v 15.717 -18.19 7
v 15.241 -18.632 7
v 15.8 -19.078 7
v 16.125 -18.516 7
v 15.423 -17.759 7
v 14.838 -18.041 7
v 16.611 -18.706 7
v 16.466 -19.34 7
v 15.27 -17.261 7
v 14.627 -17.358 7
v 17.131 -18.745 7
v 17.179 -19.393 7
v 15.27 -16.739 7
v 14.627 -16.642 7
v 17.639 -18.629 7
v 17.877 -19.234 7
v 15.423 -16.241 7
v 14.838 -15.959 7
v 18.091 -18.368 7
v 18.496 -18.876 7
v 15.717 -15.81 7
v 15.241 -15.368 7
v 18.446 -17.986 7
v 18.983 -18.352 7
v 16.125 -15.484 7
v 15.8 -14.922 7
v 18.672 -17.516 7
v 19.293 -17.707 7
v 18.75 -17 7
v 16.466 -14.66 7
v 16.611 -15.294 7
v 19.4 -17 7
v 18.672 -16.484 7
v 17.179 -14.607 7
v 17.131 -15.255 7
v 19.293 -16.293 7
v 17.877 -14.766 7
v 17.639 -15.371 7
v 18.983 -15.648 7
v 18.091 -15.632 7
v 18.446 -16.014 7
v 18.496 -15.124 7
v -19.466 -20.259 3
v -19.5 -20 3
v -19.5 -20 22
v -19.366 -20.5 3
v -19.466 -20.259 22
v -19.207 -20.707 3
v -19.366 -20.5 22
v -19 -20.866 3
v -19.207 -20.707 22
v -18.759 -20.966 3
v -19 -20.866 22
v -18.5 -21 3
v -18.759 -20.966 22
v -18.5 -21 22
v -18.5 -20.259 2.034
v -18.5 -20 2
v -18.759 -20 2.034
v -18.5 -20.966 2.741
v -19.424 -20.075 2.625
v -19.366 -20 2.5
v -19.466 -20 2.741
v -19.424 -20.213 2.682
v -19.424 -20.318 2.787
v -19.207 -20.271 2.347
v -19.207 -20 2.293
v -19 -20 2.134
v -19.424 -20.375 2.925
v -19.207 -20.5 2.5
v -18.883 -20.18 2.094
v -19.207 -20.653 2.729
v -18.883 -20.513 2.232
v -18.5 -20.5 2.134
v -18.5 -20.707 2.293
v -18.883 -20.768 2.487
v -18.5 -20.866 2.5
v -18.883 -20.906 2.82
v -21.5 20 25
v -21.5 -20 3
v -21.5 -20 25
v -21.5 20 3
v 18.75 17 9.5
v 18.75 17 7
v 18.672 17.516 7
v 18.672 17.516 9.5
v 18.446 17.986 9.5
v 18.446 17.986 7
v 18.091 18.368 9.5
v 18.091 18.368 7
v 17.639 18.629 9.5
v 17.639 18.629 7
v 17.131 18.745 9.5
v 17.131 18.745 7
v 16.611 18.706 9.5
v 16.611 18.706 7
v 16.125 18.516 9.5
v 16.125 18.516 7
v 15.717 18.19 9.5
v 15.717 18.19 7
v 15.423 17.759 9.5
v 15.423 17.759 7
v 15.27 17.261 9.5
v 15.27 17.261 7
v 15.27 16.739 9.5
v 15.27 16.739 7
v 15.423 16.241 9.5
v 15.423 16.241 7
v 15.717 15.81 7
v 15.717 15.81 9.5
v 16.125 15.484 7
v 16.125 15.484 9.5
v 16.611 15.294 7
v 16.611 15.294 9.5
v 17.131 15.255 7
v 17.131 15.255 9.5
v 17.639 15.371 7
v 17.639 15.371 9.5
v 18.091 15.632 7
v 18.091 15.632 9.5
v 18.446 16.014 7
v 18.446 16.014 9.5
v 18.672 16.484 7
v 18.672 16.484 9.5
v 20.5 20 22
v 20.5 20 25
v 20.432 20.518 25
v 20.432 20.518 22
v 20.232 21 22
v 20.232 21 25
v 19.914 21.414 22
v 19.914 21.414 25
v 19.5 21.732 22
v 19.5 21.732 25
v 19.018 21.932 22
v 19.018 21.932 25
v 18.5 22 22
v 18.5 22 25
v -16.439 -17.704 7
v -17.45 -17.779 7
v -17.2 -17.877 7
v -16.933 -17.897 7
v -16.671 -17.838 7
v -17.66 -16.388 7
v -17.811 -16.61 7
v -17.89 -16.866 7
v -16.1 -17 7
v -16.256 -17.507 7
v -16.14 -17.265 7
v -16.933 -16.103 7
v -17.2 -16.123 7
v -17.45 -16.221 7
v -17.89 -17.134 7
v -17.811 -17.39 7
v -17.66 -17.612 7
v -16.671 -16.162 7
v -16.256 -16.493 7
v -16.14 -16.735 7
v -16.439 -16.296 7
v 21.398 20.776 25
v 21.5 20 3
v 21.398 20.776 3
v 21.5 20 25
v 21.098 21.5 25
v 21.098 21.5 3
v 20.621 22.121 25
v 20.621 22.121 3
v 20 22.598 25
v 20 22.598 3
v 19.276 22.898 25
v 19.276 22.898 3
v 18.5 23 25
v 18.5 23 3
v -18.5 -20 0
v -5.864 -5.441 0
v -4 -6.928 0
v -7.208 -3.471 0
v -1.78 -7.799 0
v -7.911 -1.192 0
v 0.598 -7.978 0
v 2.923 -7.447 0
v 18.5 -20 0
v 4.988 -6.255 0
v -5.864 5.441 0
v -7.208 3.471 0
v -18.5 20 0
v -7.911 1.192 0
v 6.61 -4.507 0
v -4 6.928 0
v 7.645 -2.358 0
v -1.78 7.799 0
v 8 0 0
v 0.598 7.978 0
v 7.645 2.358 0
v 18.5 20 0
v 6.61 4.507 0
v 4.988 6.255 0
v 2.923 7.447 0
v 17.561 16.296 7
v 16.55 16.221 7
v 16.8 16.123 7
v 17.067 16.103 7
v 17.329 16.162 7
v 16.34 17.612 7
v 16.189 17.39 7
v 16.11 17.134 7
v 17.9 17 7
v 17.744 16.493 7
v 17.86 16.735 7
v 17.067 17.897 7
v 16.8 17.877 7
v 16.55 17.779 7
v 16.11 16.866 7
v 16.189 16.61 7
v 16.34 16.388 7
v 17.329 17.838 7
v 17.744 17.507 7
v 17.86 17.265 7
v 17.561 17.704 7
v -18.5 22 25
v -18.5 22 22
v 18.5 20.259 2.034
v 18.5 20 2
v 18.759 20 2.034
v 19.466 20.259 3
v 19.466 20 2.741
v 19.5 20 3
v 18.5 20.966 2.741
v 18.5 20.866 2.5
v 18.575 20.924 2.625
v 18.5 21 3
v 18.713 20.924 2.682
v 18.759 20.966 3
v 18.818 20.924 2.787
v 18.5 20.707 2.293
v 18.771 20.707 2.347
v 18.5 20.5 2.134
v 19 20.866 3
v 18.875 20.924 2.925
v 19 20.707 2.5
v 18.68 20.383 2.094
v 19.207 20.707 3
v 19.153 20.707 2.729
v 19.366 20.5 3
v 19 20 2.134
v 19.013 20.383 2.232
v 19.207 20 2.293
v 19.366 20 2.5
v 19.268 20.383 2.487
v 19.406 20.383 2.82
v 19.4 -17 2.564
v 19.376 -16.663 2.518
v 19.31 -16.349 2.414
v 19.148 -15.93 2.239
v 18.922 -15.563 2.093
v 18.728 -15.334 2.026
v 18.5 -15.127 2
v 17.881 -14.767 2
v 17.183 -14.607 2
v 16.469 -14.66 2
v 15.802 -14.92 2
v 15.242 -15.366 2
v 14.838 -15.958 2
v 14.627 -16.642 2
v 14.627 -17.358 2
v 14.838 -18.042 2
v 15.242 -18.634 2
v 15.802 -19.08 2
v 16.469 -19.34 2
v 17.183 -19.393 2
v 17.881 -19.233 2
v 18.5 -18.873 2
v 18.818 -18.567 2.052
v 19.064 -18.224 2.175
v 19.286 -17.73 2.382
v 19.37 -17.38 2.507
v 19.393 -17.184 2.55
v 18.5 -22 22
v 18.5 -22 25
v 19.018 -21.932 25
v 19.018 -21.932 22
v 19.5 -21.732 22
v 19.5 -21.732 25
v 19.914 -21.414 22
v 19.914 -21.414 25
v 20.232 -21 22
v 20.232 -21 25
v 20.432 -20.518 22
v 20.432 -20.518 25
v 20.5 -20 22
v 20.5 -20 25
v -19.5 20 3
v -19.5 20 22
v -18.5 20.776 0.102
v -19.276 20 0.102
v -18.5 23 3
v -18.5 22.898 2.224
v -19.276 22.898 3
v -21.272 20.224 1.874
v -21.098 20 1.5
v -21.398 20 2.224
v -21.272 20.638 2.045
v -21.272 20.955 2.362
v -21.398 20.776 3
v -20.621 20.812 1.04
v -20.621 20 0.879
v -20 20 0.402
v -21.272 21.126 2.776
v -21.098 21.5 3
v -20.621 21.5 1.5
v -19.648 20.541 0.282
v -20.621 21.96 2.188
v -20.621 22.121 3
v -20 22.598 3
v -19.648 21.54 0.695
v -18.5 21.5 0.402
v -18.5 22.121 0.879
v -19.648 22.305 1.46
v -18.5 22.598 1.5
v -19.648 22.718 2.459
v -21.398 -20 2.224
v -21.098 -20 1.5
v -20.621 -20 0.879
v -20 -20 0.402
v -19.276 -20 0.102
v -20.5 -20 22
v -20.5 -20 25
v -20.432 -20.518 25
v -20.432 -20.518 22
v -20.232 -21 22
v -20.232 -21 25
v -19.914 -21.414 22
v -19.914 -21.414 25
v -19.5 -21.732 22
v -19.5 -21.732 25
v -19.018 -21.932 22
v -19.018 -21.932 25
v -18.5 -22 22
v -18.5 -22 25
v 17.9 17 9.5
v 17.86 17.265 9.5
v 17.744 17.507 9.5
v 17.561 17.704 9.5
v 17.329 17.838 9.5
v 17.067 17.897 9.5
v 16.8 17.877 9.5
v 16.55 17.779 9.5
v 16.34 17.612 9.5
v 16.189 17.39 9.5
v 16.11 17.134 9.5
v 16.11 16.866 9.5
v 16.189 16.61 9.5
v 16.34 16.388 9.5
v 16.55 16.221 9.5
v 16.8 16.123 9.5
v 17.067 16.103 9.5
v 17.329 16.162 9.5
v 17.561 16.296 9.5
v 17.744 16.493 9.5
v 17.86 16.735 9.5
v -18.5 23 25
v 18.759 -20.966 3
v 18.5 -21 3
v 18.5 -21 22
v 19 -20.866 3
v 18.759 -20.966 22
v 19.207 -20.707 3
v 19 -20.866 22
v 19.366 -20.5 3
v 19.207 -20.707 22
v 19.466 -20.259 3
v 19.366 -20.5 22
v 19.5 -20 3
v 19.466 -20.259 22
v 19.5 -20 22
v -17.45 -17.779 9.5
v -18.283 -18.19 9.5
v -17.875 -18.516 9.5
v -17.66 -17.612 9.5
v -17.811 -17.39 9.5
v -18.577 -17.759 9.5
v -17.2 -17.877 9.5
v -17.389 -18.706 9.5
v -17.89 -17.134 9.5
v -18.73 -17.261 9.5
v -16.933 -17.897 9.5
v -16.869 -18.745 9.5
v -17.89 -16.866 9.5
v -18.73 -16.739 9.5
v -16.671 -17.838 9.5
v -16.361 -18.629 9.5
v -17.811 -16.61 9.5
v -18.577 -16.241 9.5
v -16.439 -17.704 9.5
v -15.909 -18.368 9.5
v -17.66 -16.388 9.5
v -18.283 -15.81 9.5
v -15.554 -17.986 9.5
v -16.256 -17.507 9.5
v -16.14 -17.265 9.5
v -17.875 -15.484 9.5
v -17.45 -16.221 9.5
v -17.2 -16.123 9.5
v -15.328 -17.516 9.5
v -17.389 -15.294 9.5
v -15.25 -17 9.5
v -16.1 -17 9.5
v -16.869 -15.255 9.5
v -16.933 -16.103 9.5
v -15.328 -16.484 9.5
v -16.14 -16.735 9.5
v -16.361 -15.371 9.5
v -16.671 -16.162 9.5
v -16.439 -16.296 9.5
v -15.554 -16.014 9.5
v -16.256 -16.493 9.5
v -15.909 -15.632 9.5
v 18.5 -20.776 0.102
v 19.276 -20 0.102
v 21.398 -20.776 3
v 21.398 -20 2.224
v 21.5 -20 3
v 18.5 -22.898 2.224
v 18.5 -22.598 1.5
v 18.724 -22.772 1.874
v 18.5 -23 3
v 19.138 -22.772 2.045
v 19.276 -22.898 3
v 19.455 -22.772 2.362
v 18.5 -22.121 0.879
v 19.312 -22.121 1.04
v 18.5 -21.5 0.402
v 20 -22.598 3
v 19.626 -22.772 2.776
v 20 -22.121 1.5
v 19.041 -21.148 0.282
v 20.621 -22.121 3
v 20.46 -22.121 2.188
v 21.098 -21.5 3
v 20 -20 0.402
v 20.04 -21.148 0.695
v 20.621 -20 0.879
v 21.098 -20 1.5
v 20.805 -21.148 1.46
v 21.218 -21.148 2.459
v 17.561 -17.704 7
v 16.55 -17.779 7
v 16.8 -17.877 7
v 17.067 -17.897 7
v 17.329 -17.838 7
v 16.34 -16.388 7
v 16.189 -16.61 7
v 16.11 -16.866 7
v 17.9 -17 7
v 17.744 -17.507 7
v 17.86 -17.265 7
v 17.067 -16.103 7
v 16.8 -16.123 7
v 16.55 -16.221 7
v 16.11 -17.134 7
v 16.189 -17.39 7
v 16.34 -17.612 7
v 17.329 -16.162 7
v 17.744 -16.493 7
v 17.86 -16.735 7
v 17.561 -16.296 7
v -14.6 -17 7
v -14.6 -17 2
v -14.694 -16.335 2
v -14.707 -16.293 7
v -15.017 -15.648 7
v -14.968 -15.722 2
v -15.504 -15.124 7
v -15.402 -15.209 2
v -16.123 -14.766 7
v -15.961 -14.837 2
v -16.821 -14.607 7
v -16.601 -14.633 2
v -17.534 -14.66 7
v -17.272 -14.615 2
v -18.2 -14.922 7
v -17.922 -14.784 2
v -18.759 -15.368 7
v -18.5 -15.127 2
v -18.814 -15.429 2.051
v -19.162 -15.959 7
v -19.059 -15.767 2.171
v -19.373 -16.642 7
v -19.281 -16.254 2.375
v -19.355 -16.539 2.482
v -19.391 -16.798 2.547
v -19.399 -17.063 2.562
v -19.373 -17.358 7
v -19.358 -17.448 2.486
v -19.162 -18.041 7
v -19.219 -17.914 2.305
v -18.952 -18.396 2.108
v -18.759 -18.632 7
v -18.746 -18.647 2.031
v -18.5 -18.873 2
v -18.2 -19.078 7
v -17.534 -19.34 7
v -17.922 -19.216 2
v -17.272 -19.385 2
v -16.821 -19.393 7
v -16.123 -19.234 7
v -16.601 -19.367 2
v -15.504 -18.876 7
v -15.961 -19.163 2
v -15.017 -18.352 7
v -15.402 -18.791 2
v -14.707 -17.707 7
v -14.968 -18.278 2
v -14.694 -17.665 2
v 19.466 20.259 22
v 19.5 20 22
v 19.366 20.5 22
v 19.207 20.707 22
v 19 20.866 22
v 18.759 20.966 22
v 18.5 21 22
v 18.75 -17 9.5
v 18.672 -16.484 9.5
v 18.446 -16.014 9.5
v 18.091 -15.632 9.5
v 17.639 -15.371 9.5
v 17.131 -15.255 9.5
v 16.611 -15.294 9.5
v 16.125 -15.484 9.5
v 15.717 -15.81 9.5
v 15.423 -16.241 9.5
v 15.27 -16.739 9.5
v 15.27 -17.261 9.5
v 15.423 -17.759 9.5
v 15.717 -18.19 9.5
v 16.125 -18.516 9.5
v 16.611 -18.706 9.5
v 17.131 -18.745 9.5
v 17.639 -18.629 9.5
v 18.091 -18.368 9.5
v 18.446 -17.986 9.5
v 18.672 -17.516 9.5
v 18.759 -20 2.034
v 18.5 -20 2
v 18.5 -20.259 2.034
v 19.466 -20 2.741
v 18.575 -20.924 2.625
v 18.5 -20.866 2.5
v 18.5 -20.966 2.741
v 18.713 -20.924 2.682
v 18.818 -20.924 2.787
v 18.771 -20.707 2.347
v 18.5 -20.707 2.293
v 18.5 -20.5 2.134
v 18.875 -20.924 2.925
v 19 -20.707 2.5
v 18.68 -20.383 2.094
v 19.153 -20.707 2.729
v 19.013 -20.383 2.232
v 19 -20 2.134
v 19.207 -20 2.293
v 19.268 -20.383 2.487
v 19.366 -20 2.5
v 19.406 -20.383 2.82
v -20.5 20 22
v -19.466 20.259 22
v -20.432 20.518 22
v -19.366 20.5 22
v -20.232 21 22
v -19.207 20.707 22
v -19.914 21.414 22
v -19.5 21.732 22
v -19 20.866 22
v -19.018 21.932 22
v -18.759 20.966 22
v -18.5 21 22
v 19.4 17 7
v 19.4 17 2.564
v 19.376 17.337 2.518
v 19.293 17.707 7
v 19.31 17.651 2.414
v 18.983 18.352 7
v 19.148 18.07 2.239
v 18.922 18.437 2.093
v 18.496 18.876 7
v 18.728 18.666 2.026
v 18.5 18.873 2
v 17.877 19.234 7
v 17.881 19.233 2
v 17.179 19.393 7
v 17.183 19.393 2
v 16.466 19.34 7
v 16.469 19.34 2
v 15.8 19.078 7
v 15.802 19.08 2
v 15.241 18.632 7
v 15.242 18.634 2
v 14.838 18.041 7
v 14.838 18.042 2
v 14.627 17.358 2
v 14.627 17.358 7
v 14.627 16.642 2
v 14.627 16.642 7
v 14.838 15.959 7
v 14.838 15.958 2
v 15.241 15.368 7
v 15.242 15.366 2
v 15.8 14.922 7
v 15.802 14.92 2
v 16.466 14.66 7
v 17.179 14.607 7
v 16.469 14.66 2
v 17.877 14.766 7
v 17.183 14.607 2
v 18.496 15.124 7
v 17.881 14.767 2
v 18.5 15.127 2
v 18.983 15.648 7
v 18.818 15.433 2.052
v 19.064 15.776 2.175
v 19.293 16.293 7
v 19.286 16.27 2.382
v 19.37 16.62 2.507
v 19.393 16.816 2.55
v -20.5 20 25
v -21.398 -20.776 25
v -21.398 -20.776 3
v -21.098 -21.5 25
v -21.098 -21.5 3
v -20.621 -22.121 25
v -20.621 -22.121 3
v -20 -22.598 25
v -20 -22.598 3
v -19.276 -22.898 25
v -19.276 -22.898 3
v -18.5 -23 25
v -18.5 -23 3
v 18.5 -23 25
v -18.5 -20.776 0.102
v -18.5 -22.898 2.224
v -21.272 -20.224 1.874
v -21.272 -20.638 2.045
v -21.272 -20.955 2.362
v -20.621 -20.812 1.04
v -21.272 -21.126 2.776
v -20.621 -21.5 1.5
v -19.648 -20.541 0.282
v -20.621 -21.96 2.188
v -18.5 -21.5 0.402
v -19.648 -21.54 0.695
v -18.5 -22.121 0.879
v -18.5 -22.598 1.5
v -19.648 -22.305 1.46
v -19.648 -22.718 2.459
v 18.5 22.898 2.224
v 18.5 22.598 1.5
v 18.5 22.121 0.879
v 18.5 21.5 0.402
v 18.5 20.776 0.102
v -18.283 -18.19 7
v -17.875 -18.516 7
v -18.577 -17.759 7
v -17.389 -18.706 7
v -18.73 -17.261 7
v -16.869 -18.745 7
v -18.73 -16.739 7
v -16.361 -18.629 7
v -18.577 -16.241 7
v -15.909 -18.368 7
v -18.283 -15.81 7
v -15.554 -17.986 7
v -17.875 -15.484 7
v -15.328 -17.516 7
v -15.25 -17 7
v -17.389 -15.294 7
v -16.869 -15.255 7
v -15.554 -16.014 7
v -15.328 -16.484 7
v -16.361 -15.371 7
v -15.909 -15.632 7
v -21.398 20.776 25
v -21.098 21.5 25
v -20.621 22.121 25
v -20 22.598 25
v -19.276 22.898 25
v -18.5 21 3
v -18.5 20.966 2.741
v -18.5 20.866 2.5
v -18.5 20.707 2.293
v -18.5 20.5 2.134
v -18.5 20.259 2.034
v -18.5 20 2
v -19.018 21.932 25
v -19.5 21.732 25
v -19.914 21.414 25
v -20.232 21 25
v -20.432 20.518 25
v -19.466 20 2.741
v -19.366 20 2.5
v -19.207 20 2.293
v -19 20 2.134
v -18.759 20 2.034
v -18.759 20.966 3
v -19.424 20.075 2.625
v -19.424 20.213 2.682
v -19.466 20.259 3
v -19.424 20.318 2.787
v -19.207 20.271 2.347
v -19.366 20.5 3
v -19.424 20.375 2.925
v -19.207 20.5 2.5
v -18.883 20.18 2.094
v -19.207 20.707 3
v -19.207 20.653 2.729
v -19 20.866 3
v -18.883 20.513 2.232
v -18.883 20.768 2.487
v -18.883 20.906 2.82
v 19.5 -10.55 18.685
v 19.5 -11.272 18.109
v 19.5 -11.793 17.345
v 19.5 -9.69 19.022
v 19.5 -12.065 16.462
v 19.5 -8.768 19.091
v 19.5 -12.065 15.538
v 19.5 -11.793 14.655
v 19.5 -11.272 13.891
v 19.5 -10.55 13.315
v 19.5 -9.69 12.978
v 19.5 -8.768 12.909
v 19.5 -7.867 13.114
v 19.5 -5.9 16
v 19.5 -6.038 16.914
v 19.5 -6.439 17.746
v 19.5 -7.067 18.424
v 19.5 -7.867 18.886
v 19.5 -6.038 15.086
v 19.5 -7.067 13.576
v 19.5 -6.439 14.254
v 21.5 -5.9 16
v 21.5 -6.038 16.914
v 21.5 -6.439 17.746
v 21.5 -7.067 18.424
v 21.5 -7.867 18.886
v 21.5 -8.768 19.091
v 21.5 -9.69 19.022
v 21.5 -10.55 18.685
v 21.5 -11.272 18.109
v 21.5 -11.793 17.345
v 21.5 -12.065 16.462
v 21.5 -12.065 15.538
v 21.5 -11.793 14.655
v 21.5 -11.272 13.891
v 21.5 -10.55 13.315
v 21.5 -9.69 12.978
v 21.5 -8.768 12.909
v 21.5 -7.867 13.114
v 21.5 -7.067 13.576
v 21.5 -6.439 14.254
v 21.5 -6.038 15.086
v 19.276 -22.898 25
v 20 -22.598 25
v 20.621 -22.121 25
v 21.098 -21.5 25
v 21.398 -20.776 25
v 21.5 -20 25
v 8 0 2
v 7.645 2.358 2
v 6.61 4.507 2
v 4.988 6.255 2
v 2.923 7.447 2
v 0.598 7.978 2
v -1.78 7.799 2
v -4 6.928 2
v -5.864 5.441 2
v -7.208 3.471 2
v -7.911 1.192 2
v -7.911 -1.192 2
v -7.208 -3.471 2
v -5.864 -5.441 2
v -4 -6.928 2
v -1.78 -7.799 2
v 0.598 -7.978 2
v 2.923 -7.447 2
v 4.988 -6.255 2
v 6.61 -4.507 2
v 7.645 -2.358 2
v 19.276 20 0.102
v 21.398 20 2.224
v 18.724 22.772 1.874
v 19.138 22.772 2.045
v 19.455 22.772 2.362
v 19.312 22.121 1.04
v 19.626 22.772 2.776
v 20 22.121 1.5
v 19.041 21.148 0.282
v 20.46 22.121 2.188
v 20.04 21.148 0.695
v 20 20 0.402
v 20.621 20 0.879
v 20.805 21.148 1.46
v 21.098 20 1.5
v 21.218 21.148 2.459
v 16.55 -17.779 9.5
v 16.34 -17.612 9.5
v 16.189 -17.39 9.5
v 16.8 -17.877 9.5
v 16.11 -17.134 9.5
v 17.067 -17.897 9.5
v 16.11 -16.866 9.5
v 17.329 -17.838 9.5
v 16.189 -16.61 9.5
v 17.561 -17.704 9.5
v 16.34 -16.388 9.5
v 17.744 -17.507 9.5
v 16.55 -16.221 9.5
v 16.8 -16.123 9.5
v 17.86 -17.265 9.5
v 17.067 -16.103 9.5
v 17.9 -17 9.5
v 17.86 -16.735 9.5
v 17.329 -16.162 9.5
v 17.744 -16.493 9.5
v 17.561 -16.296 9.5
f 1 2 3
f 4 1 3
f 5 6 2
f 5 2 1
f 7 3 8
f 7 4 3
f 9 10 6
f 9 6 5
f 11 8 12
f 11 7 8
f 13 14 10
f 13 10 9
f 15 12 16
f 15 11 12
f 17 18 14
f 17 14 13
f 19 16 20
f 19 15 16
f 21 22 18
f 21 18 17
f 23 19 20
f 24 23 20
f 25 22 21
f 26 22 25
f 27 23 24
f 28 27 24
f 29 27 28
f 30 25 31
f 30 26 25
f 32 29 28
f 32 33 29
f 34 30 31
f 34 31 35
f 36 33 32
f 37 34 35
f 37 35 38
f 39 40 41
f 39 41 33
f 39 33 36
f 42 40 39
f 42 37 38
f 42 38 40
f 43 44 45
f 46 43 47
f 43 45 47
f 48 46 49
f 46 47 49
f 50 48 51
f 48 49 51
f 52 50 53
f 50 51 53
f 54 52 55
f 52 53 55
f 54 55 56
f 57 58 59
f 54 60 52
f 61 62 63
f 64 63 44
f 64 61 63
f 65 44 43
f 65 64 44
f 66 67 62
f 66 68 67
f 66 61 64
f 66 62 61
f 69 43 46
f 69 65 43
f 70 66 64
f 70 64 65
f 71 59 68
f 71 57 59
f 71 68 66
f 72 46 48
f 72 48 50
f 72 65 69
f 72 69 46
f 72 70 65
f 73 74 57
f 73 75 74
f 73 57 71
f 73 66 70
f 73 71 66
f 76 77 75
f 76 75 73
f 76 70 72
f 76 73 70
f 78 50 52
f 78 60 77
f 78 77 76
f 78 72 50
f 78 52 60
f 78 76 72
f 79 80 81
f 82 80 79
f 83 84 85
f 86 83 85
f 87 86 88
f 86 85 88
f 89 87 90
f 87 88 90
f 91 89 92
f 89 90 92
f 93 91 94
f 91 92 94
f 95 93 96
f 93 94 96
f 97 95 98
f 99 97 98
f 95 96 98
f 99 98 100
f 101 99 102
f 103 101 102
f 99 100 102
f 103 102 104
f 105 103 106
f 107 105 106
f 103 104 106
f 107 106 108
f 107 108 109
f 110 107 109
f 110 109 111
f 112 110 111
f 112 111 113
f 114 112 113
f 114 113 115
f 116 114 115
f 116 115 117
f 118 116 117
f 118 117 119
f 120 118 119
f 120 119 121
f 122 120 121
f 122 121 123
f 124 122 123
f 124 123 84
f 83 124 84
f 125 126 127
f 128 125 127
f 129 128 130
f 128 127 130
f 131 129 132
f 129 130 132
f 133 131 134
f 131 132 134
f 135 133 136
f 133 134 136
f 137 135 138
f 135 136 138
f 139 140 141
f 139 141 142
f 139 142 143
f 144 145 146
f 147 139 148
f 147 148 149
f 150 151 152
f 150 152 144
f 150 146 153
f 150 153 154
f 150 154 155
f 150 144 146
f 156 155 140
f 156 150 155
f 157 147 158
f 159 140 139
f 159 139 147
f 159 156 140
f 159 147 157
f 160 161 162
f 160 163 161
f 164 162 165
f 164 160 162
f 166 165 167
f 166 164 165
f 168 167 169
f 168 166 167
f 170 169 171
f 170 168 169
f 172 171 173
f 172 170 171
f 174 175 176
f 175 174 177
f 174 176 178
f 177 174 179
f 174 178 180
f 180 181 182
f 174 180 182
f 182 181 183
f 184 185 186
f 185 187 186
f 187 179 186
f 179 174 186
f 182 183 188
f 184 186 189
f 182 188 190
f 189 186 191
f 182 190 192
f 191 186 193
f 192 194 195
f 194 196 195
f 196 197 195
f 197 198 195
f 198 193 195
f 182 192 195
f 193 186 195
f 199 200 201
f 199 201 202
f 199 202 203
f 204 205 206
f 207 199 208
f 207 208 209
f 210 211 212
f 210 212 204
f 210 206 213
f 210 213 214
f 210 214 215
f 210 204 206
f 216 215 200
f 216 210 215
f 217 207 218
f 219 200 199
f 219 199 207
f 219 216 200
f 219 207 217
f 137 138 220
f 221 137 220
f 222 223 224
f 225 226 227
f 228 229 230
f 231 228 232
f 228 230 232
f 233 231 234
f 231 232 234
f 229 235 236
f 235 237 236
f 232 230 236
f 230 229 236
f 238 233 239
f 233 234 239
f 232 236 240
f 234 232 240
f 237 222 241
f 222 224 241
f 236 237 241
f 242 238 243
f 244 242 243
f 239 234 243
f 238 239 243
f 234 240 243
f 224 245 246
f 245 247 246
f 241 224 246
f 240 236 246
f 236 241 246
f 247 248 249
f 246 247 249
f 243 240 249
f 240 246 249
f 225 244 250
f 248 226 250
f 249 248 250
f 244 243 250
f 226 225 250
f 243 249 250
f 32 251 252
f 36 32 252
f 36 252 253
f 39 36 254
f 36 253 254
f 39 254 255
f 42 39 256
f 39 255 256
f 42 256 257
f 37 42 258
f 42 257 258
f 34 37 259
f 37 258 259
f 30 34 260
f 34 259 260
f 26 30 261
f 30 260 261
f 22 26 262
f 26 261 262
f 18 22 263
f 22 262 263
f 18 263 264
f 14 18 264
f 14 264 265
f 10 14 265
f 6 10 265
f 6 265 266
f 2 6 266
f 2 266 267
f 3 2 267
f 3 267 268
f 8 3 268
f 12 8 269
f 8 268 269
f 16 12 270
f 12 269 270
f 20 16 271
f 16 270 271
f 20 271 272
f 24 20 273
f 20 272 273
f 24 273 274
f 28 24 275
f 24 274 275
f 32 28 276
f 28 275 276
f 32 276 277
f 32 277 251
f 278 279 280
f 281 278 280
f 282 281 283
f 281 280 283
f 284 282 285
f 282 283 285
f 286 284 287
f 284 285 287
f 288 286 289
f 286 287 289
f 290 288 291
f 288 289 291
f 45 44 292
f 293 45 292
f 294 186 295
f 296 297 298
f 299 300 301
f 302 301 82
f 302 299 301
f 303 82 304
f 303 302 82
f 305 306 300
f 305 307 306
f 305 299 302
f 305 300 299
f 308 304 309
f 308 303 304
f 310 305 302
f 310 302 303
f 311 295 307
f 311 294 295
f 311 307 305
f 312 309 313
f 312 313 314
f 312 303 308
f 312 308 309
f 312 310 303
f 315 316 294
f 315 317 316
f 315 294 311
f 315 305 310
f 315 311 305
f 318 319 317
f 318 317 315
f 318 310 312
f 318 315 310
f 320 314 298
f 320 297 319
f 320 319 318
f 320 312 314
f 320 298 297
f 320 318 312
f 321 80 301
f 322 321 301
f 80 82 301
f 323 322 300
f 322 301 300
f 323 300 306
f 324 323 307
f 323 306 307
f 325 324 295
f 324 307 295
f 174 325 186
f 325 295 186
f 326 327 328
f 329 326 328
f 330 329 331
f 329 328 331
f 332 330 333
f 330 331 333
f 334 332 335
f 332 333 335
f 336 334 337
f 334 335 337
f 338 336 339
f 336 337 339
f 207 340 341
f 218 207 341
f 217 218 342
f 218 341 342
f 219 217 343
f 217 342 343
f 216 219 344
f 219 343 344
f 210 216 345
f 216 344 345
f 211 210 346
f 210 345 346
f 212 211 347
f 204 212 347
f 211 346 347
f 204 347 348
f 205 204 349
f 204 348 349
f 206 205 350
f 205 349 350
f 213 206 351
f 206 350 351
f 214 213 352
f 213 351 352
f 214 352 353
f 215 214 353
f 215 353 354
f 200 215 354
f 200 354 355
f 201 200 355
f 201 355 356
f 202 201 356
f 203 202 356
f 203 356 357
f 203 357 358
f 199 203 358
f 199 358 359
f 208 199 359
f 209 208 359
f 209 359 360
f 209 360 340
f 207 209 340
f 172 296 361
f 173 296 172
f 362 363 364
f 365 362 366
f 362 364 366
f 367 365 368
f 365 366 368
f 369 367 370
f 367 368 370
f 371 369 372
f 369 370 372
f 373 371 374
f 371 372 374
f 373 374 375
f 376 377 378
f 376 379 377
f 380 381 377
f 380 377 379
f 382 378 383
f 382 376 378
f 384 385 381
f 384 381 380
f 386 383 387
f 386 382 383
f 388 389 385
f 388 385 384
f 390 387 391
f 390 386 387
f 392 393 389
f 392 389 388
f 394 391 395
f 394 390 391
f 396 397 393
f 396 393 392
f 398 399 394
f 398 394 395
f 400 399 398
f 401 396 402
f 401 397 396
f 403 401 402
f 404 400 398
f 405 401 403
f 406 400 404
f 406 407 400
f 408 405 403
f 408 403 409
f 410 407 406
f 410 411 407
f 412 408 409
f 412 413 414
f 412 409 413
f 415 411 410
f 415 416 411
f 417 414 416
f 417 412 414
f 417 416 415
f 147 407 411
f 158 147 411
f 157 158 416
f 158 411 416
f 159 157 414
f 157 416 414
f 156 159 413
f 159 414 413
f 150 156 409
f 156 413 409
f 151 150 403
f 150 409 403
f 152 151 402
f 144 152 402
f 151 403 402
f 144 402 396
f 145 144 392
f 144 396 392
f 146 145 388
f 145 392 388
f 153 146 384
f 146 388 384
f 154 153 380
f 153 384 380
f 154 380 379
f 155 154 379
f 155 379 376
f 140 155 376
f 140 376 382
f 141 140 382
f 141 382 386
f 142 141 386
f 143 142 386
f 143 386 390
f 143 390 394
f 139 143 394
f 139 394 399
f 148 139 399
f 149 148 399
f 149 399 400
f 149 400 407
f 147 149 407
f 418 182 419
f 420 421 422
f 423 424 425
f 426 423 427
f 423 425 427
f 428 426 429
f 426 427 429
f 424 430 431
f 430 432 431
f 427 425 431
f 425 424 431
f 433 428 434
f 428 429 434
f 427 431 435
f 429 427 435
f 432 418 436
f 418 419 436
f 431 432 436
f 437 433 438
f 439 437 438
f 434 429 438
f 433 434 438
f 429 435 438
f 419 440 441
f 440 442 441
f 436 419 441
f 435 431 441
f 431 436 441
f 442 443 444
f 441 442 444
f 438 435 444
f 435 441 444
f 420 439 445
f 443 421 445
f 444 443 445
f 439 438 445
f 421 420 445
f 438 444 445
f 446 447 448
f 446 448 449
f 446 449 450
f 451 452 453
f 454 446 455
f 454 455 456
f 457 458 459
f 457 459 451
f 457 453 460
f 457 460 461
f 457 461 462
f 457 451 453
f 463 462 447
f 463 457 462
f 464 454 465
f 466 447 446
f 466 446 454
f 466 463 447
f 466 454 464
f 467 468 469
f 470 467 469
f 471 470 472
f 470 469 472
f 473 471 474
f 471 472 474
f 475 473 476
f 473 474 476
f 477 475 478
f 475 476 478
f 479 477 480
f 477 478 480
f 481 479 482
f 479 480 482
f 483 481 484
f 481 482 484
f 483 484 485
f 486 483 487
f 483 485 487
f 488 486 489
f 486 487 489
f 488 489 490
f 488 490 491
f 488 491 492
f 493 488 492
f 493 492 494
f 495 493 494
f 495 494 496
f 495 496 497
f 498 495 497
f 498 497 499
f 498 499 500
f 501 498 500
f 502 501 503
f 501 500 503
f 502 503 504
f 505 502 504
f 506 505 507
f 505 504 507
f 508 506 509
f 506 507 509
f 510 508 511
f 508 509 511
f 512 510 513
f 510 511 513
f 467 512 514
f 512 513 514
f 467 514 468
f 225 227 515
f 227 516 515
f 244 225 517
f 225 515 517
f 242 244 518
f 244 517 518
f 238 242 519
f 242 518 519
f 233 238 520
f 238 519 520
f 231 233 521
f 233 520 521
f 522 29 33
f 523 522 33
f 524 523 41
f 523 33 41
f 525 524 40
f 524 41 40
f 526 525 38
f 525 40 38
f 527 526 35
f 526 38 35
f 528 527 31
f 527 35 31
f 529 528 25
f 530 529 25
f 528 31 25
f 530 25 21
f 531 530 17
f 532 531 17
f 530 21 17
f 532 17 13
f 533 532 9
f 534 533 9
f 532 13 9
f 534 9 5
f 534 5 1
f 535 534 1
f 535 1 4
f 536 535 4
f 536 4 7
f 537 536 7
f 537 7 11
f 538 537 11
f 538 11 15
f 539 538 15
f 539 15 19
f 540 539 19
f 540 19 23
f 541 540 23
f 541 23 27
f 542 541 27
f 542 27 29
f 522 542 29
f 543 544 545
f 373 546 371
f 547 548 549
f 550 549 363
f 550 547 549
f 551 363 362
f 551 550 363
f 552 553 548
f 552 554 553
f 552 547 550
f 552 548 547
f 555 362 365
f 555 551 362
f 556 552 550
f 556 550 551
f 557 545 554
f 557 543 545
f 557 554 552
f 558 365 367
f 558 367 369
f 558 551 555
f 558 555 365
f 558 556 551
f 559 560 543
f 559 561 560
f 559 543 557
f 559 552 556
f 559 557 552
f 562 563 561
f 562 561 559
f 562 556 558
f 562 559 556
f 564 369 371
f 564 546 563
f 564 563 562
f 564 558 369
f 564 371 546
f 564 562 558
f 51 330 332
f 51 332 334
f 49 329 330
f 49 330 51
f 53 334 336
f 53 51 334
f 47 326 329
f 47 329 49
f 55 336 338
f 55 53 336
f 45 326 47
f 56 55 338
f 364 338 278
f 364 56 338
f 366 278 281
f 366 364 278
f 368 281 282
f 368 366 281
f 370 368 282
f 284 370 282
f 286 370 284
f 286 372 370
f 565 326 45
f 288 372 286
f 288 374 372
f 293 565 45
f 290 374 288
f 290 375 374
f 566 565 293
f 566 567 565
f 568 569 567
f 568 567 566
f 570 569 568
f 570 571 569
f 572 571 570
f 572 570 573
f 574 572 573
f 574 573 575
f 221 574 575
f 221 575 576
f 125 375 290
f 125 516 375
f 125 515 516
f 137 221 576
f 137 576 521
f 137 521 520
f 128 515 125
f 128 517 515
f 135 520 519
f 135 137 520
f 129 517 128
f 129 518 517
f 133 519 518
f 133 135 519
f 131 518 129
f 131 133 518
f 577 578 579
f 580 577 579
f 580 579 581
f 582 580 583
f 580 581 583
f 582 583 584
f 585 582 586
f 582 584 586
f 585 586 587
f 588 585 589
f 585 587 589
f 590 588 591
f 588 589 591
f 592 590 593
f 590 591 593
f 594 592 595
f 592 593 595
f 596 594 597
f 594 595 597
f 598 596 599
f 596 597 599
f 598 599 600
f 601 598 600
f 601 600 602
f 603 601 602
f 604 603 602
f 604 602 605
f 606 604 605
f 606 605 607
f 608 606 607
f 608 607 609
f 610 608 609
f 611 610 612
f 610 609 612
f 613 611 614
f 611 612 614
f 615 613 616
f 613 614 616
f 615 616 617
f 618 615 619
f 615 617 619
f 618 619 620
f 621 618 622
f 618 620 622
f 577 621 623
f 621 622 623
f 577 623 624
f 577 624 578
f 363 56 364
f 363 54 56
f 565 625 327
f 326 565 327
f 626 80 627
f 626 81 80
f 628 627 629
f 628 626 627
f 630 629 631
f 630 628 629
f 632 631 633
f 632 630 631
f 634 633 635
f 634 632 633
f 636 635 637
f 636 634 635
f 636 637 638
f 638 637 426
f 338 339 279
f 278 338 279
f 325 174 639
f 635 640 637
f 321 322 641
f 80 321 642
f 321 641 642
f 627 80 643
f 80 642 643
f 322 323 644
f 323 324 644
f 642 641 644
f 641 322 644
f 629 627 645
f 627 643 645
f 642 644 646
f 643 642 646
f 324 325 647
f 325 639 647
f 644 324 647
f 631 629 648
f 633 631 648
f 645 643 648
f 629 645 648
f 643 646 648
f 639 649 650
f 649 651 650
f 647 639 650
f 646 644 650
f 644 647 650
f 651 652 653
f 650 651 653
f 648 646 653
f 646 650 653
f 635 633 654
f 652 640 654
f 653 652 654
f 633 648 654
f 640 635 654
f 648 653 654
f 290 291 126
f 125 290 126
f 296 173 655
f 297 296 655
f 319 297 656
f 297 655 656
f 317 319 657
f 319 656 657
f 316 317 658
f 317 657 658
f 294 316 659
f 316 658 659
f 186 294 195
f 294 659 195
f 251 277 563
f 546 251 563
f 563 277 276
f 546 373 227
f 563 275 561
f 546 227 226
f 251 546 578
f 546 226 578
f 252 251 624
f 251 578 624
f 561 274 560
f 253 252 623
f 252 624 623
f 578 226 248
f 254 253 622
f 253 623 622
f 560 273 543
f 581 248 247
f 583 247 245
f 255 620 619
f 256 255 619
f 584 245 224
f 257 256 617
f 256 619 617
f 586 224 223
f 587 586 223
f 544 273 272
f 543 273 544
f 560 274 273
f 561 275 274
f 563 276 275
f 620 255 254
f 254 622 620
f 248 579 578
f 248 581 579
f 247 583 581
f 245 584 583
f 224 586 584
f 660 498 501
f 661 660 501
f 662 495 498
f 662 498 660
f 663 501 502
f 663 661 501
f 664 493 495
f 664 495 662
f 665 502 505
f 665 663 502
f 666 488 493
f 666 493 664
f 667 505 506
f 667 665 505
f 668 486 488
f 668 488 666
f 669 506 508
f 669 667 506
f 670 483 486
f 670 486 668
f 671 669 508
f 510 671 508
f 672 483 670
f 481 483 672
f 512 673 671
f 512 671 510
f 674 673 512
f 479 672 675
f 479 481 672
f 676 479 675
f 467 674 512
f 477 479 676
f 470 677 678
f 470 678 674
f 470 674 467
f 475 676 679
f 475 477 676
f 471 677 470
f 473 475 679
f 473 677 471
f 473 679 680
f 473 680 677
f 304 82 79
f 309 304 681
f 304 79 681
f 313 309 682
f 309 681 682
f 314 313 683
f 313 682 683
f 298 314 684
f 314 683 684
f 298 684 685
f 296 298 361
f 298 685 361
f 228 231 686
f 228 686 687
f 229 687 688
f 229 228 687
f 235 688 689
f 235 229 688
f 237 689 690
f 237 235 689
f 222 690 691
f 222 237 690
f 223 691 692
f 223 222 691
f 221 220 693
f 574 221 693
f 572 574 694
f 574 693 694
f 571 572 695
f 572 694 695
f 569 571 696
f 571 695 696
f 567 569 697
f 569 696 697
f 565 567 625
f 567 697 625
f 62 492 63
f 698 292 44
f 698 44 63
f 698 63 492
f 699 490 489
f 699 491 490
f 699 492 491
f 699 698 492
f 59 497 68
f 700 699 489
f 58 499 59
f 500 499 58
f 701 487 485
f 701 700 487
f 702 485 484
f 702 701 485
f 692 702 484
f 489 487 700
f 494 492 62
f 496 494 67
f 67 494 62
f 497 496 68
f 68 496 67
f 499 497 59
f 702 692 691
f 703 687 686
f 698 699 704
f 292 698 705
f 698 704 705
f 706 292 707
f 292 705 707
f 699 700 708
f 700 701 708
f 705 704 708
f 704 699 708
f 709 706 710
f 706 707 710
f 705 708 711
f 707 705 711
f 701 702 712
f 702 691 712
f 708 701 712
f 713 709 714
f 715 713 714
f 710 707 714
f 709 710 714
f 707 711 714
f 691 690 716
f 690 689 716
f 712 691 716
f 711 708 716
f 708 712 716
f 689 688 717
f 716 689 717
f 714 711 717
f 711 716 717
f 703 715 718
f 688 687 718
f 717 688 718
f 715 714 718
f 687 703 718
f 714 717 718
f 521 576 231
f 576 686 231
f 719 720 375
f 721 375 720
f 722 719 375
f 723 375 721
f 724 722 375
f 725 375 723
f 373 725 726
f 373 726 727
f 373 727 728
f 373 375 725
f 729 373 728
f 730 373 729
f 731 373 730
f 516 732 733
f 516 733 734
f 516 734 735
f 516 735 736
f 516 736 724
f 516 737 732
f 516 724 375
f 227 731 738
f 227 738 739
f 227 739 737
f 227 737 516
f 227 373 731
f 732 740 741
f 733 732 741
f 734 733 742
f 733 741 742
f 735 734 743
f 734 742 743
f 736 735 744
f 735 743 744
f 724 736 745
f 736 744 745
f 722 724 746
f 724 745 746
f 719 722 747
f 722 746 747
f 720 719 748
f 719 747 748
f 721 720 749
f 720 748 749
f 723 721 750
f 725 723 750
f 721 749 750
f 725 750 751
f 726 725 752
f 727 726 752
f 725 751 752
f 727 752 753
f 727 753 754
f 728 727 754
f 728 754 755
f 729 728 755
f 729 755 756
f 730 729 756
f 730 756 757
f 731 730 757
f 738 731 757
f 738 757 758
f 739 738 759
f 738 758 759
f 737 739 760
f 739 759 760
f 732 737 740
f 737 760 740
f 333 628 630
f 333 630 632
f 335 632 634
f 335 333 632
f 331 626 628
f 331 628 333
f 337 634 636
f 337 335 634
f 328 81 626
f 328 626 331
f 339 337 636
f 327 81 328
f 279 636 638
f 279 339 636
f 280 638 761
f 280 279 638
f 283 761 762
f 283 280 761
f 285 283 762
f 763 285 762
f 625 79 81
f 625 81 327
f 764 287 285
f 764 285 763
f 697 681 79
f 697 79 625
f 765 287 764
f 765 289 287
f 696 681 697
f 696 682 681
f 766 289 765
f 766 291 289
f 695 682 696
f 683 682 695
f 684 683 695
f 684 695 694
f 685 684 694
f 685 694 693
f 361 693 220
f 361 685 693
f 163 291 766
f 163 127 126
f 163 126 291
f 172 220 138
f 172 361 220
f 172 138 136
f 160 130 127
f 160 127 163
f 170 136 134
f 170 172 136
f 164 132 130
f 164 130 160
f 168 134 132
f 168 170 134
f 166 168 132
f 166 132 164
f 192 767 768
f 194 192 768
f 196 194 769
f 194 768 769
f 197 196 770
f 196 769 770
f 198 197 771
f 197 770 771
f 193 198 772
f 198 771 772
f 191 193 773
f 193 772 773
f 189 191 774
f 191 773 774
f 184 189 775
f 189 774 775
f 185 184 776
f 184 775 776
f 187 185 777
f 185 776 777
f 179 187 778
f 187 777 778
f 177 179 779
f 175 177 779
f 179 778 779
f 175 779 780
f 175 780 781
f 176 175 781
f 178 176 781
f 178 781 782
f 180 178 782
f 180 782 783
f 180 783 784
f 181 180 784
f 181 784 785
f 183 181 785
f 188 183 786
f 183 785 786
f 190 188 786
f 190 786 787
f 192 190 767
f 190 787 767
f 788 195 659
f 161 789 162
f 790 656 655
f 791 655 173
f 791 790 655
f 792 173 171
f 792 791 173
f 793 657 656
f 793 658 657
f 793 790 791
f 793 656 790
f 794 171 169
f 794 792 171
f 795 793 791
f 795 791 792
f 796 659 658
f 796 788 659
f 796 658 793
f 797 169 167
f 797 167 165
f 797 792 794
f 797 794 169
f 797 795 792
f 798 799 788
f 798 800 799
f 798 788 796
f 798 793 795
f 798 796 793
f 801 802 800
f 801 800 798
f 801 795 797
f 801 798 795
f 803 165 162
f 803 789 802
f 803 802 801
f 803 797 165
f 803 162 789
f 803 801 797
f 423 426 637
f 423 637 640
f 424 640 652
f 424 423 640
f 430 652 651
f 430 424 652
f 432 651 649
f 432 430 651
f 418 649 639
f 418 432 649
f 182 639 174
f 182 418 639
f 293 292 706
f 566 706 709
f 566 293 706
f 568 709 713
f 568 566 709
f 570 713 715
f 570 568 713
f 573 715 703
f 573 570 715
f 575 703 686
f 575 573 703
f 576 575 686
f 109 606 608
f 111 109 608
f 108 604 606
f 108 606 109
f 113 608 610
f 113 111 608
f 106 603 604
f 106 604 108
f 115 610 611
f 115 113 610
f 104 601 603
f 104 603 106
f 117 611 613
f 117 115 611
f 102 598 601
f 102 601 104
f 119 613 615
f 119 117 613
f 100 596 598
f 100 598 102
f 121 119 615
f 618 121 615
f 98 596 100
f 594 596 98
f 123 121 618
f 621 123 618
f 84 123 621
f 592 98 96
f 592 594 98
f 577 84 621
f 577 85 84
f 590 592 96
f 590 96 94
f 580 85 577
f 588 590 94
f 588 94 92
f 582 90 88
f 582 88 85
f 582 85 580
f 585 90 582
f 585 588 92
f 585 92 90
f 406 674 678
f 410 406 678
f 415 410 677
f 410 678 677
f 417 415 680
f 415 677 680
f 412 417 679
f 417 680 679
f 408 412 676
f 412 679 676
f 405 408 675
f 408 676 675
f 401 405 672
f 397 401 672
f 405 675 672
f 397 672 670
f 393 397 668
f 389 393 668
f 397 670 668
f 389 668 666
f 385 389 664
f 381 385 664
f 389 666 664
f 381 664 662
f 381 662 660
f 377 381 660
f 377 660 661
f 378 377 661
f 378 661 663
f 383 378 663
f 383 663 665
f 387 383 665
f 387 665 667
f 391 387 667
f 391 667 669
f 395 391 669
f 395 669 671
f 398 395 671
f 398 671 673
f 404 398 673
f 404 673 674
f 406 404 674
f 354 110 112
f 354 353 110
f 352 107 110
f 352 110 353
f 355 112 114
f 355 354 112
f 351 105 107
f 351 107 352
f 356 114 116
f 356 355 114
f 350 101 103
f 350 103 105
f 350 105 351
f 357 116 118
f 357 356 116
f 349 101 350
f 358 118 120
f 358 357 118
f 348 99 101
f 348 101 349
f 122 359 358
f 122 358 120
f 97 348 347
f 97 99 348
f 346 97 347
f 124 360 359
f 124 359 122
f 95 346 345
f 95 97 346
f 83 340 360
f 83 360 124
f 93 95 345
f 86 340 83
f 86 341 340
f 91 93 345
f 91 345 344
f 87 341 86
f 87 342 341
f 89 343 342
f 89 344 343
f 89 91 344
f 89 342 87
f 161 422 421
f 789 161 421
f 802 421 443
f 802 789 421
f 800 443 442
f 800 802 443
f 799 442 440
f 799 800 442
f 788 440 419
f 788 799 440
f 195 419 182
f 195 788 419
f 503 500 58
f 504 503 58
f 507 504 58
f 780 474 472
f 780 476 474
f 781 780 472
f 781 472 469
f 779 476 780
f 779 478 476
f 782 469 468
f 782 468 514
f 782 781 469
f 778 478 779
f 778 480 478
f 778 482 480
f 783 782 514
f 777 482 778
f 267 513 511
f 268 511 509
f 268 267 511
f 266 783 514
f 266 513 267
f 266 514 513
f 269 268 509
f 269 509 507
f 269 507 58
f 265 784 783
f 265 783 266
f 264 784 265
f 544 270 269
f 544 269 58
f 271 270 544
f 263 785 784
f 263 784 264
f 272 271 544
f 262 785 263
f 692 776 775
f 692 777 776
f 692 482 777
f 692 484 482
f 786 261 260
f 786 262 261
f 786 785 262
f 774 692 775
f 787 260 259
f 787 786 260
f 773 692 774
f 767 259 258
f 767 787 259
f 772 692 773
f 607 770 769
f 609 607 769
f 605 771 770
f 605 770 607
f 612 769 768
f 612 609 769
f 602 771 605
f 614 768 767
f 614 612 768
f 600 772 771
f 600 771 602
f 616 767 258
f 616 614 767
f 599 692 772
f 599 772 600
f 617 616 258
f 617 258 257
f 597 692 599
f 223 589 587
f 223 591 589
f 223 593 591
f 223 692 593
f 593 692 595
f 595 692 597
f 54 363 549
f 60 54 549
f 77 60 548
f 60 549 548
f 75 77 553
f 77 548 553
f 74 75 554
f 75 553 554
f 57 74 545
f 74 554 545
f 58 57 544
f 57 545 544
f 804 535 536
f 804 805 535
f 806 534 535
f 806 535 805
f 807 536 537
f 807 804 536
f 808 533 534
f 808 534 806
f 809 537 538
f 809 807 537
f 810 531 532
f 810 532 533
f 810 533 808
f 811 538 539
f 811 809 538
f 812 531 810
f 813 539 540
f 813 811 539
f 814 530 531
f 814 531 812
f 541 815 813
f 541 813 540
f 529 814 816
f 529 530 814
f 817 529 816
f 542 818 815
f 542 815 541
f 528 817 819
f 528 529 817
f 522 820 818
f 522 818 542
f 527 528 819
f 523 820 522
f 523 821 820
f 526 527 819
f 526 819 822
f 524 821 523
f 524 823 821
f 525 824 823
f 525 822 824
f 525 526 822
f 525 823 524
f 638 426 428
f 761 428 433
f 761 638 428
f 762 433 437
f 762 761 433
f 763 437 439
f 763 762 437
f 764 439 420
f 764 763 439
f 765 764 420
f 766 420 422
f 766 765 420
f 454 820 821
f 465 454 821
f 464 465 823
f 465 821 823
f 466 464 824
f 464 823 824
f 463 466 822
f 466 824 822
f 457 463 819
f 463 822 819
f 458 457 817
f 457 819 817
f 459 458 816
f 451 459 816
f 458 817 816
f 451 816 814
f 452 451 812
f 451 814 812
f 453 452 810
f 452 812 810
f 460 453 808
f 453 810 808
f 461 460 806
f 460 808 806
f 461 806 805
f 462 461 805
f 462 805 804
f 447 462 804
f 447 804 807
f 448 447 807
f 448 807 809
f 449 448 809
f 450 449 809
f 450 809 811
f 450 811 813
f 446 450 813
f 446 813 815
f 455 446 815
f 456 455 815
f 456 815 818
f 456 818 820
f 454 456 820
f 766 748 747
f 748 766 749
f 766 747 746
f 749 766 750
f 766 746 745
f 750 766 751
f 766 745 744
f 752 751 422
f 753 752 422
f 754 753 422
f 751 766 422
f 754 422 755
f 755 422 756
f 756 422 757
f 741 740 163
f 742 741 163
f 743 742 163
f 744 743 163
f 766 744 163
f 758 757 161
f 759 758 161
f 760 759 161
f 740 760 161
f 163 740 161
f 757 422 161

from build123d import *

# Parameters (mm, degrees)
F0_W      = 43
F0_H      = 46
F1_DEPTH  = 25
F2_R      = 3
F3_T      = -2
F4_R      = 8
F5_DEPTH  = 2
F6_R      = 3.1
F7_DEPTH  = 2
F8_R      = 1.75
F9_DEPTH  = 7.5
F11_R     = 0.9
F12_DEPTH = 7
F15_DEPTH = 3
F16_R     = 2.4
F17_DEPTH = 5


with BuildPart() as f1:
    # F0 (on Top) → F1 (new body)
    with BuildSketch(Plane.XY):
        Rectangle(F0_W, F0_H)
    extrude(amount=F1_DEPTH)

    # F2
    f2_edges = [f1.edges().sort_by_distance(p)[0] for p in [
        (21.5, 0, 0),
        (0, -23, 0),
        (0, 23, 0),
        (-21.5, 0, 0),
        (21.5, 23, 12.5),
        (21.5, -23, 12.5),
        (-21.5, -23, 12.5),
        (-21.5, 23, 12.5),
    ]]
    fillet(f2_edges, radius=F2_R)

    # F3
    f3_openings = [f1.faces().sort_by_distance(p)[0] for p in [
        (0, 0, 25),
    ]]
    offset(amount=F3_T, openings=f3_openings)

    # F4 (on face) → F5 (cut, through all)
    with BuildSketch(Plane.XY.offset(2)):
        Circle(F4_R)
    extrude(amount=-F5_DEPTH, mode=Mode.SUBTRACT)

    # F6 (on face) → F7 (cut, through all)
    with BuildSketch(Plane.YZ.offset(21.5)):
        with Locations((-9, 16)):
            Circle(F6_R)
    extrude(amount=-F7_DEPTH, mode=Mode.SUBTRACT)

    # F8 (on face) → F9 (join)
    with BuildSketch(Plane.XY.offset(2)):
        with Locations((17, 17)):
            Circle(F8_R)
        with Locations((17, -17)):
            Circle(F8_R)
        with Locations((-17, -17)):
            Circle(F8_R)
    extrude(amount=F9_DEPTH)

    # F11 (on offset) → F12 (cut)
    with BuildSketch(Plane.XY.offset(9.5)):
        with Locations((17, 17)):
            Circle(F11_R)
        with Locations((17, -17)):
            Circle(F11_R)
        with Locations((-17, -17)):
            Circle(F11_R)
    extrude(amount=-F12_DEPTH, mode=Mode.SUBTRACT)

    # F14 (on offset) → F15 (cut)
    with BuildSketch(Plane.XY.offset(25)):
        with BuildLine():
            Line((-18.5, -22), (18.5, -22))
            ThreePointArc((18.5, -22), (19.9142135624, -21.4142135624), (20.5, -20))
            Line((20.5, -20), (20.5, 20))
            ThreePointArc((20.5, 20), (19.9142135624, 21.4142135624), (18.5, 22))
            Line((18.5, 22), (-18.5, 22))
            ThreePointArc((-18.5, 22), (-19.9142135624, 21.4142135624), (-20.5, 20))
            Line((-20.5, 20), (-20.5, -20))
            ThreePointArc((-20.5, -20), (-19.9142135624, -21.4142135624), (-18.5, -22))
        make_face()
    extrude(amount=-F15_DEPTH, mode=Mode.SUBTRACT)

    # F16 (on face) → F17 (join)
    with BuildSketch(Plane.XY.offset(2)):
        with Locations((17, 17)):
            Circle(F16_R)
        with Locations((17, -17)):
            Circle(F16_R)
        with Locations((-17, -17)):
            Circle(F16_R)
    extrude(amount=F17_DEPTH)


solid = f1.part
